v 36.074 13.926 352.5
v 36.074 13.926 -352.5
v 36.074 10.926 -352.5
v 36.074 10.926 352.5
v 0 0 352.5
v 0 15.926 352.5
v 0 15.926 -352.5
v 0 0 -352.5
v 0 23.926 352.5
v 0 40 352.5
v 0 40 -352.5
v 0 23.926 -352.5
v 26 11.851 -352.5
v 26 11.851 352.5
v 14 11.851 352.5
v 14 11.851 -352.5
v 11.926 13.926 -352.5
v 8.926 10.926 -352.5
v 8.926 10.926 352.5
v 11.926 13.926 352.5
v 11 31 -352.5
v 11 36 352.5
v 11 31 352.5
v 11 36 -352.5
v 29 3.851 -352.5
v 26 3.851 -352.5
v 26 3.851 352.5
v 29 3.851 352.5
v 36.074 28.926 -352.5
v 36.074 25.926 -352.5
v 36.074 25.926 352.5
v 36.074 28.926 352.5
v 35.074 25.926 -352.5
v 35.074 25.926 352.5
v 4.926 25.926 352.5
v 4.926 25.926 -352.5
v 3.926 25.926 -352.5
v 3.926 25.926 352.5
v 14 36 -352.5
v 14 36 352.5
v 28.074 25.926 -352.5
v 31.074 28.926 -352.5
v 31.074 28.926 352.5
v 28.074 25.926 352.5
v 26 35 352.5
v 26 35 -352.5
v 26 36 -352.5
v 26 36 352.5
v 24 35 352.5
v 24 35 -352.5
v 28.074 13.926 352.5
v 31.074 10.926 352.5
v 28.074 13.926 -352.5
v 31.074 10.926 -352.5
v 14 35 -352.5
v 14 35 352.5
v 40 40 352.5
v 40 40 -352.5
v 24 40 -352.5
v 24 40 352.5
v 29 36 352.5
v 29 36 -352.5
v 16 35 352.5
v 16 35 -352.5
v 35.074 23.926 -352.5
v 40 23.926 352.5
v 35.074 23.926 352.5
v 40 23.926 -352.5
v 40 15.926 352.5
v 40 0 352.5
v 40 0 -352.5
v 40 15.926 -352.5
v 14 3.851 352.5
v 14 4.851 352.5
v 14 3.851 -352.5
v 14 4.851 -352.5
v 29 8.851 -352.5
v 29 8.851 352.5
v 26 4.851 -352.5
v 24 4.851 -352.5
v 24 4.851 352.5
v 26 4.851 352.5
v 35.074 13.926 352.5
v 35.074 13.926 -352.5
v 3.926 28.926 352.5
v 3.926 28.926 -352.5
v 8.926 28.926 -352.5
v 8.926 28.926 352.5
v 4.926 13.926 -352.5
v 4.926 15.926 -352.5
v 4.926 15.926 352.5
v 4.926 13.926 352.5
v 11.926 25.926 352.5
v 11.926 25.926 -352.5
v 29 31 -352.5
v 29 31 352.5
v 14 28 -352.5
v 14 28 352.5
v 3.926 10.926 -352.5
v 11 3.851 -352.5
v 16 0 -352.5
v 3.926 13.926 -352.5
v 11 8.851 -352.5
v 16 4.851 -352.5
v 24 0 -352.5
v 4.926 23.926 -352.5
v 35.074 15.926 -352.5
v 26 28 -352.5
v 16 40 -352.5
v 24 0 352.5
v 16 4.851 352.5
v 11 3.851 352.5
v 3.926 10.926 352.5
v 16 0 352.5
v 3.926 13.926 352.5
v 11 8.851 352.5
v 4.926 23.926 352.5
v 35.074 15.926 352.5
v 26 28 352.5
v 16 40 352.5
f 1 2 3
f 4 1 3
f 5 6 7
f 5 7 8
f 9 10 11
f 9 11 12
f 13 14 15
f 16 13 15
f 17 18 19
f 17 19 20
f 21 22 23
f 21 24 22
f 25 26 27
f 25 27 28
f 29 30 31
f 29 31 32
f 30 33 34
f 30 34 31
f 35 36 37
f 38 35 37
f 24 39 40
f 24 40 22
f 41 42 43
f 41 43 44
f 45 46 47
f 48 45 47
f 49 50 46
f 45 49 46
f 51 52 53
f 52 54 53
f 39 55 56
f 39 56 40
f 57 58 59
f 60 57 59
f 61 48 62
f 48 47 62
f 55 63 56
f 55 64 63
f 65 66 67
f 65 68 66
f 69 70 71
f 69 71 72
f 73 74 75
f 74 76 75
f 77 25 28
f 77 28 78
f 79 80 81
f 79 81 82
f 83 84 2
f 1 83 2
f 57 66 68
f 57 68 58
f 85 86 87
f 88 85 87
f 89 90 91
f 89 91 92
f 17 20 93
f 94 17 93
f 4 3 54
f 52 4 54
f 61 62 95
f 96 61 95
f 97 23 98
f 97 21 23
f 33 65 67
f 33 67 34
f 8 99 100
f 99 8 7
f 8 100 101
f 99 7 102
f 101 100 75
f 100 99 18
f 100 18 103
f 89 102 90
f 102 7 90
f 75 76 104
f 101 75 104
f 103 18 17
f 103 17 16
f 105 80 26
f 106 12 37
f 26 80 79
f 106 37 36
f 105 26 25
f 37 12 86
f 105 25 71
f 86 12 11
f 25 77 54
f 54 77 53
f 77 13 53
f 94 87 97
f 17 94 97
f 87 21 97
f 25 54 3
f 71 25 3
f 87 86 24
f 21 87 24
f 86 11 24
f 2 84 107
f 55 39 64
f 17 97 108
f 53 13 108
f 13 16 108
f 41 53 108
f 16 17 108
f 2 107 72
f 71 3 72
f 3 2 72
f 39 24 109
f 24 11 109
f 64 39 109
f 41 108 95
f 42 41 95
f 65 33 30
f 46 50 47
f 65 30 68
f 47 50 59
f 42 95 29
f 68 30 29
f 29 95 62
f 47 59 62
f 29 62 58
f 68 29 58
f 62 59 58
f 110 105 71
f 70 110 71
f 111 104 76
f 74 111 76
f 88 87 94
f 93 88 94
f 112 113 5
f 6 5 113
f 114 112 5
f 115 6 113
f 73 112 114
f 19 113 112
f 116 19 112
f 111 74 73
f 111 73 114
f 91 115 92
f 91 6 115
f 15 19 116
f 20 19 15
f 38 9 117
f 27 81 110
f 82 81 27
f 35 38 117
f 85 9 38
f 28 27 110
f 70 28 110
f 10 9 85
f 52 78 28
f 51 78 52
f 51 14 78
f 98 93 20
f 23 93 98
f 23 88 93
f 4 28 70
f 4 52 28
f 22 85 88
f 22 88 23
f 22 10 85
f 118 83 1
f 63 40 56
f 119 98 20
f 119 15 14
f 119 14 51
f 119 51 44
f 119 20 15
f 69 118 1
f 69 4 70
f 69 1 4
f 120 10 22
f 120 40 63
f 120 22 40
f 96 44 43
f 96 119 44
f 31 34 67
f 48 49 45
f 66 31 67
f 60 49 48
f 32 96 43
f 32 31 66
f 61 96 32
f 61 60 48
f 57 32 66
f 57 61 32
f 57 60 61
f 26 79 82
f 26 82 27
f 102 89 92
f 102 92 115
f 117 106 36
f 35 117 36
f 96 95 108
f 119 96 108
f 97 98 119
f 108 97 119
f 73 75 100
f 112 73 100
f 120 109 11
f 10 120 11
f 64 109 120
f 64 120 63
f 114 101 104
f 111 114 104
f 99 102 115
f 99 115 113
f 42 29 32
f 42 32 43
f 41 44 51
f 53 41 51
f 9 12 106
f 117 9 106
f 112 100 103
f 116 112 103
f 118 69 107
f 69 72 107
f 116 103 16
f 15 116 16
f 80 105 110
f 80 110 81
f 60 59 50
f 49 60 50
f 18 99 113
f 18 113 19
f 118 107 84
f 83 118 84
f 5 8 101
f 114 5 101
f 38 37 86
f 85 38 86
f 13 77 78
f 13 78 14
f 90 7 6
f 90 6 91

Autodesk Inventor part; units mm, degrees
ref_plane "YZ Plane" through (0, 0, 0) normal (1, 0, 0) x (0, 1, 0)
ref_plane "XZ Plane" through (0, 0, 0) normal (0, 1, 0) x (-1, 0, 0)
ref_plane "XY Plane" through (0, 0, 0) normal (0, 0, 1) x (1, 0, 0)
sketch "스케치1" plane through (0, 0, 0) normal (0, 0, 1) x (1, 0, 0)
  line L0 (40, 40) -> (25, 40)
  line L1 (15, 40) -> (0, 40)
  line L2 (16, 40) -> (16, 35)
  line L3 (16, 35) -> (14, 35)
  line L4 (14, 35) -> (14, 36)
  line L5 (14, 36) -> (11, 36)
  line L6 (11, 36) -> (11, 31)
  line L7 (11, 31) -> (14, 28)
  line L8 (11, 31) -> (20.81, 31) construction
  line L9 (14, 28) -> (20, 28)
  line L10 (24, 40) -> (24, 35)
  line L11 (24, 35) -> (26, 35)
  line L12 (26, 35) -> (26, 36)
  line L13 (26, 36) -> (29, 36)
  line L14 (29, 36) -> (29, 31)
  line L15 (29, 31) -> (26, 28)
  line L16 (29, 31) -> (19.19, 31) construction
  line L17 (26, 28) -> (20, 28)
  line L18 (-0.0744, 15.9256) -> (4.9256, 15.9256)
  line L19 (-0.0744, 23.9256) -> (4.9256, 23.9256)
  line L20 (4.9256, 23.9256) -> (4.9256, 25.9256)
  line L21 (11.9256, 25.9256) -> (11.9256, 19.9256)
  line L22 (8.9256, 28.9256) -> (8.9256, 19.1155) construction
  line L23 (8.9256, 28.9256) -> (11.9256, 25.9256)
  line L24 (3.9256, 28.9256) -> (8.9256, 28.9256)
  line L25 (3.9256, 25.9256) -> (3.9256, 28.9256)
  line L26 (4.9256, 25.9256) -> (3.9256, 25.9256)
  line L27 (4.9256, 15.9256) -> (4.9256, 13.9256)
  line L28 (11.9256, 13.9256) -> (11.9256, 19.9256)
  line L29 (4.9256, 13.9256) -> (3.9256, 13.9256)
  line L30 (8.9256, 10.9256) -> (11.9256, 13.9256)
  line L31 (8.9256, 10.9256) -> (8.9256, 20.7356) construction
  line L32 (3.9256, 13.9256) -> (3.9256, 10.9256)
  line L33 (3.9256, 10.9256) -> (8.9256, 10.9256)
  line L34 (24, -0.1488) -> (24, 4.8512)
  line L35 (16, -0.1488) -> (16, 4.8512)
  line L36 (16, 4.8512) -> (14, 4.8512)
  line L37 (14, 11.8512) -> (20, 11.8512)
  line L38 (11, 8.8512) -> (20.81, 8.8512) construction
  line L39 (11, 8.8512) -> (14, 11.8512)
  line L40 (11, 3.8512) -> (11, 8.8512)
  line L41 (14, 3.8512) -> (11, 3.8512)
  line L42 (14, 4.8512) -> (14, 3.8512)
  line L43 (24, 4.8512) -> (26, 4.8512)
  line L44 (26, 11.8512) -> (20, 11.8512)
  line L45 (26, 4.8512) -> (26, 3.8512)
  line L46 (29, 8.8512) -> (26, 11.8512)
  line L47 (29, 8.8512) -> (19.19, 8.8512) construction
  line L48 (26, 3.8512) -> (29, 3.8512)
  line L49 (29, 3.8512) -> (29, 8.8512)
  line L50 (40.0744, 23.9256) -> (35.0744, 23.9256)
  line L51 (40.0744, 15.9256) -> (35.0744, 15.9256)
  line L52 (35.0744, 15.9256) -> (35.0744, 13.9256)
  line L53 (28.0744, 13.9256) -> (28.0744, 19.9256)
  line L54 (31.0744, 10.9256) -> (31.0744, 20.7356) construction
  line L55 (31.0744, 10.9256) -> (28.0744, 13.9256)
  line L56 (36.0744, 10.9256) -> (31.0744, 10.9256)
  line L57 (36.0744, 13.9256) -> (36.0744, 10.9256)
  line L58 (35.0744, 13.9256) -> (36.0744, 13.9256)
  line L59 (35.0744, 23.9256) -> (35.0744, 25.9256)
  line L60 (28.0744, 25.9256) -> (28.0744, 19.9256)
  line L61 (35.0744, 25.9256) -> (36.0744, 25.9256)
  line L62 (31.0744, 28.9256) -> (28.0744, 25.9256)
  line L63 (31.0744, 28.9256) -> (31.0744, 19.1155) construction
  line L64 (36.0744, 25.9256) -> (36.0744, 28.9256)
  line L65 (36.0744, 28.9256) -> (31.0744, 28.9256)
  line L66 (11, 20) -> (11.9256, 20)
  line L67 (28.0744, 20) -> (29, 20)
  line L68 (20, 3.8512) -> (20, 4.8512)
  line L69 (20, 35) -> (20, 36)
  line L70 (15, 40) -> (16, 40)
  line L71 (24, 40) -> (25, 40)
  line L72 (0, 40) -> (0, 23.9256)
  line L73 (0, 15.9256) -> (0, 0)
  line L74 (40, 0) -> (40, 15.9256)
  line L75 (40, 23.9256) -> (40, 40)
  line L76 (0, 0) -> (16, 0)
  line L77 (24, 0) -> (40, 0)
  point P0 (25, 38)
  point P1 (20, 19.9256)
  point P2 (15, 35)
  point P3 (25, 35)
  point P4 (4.9256, 24.9256)
  point P5 (4.9256, 14.9256)
  point P6 (15, 4.8512)
  point P7 (25, 4.8512)
  point P8 (35.0744, 14.9256)
  point P9 (35.0744, 24.9256)
  dimension "d0" = 40
  dimension "d1" = 40
  dimension "d14" = 2
  dimension "d15" = 5
  dimension "d16" = 1
  dimension "d17" = 3
  dimension "d18" = 5
  dimension "d19" = 45
  dimension "d21" = 7
  dimension "d24" = 360
extrude "돌출1" add sketch "스케치1" along normal mid plane 705
properties part number "70.5" material "철, 회색"
